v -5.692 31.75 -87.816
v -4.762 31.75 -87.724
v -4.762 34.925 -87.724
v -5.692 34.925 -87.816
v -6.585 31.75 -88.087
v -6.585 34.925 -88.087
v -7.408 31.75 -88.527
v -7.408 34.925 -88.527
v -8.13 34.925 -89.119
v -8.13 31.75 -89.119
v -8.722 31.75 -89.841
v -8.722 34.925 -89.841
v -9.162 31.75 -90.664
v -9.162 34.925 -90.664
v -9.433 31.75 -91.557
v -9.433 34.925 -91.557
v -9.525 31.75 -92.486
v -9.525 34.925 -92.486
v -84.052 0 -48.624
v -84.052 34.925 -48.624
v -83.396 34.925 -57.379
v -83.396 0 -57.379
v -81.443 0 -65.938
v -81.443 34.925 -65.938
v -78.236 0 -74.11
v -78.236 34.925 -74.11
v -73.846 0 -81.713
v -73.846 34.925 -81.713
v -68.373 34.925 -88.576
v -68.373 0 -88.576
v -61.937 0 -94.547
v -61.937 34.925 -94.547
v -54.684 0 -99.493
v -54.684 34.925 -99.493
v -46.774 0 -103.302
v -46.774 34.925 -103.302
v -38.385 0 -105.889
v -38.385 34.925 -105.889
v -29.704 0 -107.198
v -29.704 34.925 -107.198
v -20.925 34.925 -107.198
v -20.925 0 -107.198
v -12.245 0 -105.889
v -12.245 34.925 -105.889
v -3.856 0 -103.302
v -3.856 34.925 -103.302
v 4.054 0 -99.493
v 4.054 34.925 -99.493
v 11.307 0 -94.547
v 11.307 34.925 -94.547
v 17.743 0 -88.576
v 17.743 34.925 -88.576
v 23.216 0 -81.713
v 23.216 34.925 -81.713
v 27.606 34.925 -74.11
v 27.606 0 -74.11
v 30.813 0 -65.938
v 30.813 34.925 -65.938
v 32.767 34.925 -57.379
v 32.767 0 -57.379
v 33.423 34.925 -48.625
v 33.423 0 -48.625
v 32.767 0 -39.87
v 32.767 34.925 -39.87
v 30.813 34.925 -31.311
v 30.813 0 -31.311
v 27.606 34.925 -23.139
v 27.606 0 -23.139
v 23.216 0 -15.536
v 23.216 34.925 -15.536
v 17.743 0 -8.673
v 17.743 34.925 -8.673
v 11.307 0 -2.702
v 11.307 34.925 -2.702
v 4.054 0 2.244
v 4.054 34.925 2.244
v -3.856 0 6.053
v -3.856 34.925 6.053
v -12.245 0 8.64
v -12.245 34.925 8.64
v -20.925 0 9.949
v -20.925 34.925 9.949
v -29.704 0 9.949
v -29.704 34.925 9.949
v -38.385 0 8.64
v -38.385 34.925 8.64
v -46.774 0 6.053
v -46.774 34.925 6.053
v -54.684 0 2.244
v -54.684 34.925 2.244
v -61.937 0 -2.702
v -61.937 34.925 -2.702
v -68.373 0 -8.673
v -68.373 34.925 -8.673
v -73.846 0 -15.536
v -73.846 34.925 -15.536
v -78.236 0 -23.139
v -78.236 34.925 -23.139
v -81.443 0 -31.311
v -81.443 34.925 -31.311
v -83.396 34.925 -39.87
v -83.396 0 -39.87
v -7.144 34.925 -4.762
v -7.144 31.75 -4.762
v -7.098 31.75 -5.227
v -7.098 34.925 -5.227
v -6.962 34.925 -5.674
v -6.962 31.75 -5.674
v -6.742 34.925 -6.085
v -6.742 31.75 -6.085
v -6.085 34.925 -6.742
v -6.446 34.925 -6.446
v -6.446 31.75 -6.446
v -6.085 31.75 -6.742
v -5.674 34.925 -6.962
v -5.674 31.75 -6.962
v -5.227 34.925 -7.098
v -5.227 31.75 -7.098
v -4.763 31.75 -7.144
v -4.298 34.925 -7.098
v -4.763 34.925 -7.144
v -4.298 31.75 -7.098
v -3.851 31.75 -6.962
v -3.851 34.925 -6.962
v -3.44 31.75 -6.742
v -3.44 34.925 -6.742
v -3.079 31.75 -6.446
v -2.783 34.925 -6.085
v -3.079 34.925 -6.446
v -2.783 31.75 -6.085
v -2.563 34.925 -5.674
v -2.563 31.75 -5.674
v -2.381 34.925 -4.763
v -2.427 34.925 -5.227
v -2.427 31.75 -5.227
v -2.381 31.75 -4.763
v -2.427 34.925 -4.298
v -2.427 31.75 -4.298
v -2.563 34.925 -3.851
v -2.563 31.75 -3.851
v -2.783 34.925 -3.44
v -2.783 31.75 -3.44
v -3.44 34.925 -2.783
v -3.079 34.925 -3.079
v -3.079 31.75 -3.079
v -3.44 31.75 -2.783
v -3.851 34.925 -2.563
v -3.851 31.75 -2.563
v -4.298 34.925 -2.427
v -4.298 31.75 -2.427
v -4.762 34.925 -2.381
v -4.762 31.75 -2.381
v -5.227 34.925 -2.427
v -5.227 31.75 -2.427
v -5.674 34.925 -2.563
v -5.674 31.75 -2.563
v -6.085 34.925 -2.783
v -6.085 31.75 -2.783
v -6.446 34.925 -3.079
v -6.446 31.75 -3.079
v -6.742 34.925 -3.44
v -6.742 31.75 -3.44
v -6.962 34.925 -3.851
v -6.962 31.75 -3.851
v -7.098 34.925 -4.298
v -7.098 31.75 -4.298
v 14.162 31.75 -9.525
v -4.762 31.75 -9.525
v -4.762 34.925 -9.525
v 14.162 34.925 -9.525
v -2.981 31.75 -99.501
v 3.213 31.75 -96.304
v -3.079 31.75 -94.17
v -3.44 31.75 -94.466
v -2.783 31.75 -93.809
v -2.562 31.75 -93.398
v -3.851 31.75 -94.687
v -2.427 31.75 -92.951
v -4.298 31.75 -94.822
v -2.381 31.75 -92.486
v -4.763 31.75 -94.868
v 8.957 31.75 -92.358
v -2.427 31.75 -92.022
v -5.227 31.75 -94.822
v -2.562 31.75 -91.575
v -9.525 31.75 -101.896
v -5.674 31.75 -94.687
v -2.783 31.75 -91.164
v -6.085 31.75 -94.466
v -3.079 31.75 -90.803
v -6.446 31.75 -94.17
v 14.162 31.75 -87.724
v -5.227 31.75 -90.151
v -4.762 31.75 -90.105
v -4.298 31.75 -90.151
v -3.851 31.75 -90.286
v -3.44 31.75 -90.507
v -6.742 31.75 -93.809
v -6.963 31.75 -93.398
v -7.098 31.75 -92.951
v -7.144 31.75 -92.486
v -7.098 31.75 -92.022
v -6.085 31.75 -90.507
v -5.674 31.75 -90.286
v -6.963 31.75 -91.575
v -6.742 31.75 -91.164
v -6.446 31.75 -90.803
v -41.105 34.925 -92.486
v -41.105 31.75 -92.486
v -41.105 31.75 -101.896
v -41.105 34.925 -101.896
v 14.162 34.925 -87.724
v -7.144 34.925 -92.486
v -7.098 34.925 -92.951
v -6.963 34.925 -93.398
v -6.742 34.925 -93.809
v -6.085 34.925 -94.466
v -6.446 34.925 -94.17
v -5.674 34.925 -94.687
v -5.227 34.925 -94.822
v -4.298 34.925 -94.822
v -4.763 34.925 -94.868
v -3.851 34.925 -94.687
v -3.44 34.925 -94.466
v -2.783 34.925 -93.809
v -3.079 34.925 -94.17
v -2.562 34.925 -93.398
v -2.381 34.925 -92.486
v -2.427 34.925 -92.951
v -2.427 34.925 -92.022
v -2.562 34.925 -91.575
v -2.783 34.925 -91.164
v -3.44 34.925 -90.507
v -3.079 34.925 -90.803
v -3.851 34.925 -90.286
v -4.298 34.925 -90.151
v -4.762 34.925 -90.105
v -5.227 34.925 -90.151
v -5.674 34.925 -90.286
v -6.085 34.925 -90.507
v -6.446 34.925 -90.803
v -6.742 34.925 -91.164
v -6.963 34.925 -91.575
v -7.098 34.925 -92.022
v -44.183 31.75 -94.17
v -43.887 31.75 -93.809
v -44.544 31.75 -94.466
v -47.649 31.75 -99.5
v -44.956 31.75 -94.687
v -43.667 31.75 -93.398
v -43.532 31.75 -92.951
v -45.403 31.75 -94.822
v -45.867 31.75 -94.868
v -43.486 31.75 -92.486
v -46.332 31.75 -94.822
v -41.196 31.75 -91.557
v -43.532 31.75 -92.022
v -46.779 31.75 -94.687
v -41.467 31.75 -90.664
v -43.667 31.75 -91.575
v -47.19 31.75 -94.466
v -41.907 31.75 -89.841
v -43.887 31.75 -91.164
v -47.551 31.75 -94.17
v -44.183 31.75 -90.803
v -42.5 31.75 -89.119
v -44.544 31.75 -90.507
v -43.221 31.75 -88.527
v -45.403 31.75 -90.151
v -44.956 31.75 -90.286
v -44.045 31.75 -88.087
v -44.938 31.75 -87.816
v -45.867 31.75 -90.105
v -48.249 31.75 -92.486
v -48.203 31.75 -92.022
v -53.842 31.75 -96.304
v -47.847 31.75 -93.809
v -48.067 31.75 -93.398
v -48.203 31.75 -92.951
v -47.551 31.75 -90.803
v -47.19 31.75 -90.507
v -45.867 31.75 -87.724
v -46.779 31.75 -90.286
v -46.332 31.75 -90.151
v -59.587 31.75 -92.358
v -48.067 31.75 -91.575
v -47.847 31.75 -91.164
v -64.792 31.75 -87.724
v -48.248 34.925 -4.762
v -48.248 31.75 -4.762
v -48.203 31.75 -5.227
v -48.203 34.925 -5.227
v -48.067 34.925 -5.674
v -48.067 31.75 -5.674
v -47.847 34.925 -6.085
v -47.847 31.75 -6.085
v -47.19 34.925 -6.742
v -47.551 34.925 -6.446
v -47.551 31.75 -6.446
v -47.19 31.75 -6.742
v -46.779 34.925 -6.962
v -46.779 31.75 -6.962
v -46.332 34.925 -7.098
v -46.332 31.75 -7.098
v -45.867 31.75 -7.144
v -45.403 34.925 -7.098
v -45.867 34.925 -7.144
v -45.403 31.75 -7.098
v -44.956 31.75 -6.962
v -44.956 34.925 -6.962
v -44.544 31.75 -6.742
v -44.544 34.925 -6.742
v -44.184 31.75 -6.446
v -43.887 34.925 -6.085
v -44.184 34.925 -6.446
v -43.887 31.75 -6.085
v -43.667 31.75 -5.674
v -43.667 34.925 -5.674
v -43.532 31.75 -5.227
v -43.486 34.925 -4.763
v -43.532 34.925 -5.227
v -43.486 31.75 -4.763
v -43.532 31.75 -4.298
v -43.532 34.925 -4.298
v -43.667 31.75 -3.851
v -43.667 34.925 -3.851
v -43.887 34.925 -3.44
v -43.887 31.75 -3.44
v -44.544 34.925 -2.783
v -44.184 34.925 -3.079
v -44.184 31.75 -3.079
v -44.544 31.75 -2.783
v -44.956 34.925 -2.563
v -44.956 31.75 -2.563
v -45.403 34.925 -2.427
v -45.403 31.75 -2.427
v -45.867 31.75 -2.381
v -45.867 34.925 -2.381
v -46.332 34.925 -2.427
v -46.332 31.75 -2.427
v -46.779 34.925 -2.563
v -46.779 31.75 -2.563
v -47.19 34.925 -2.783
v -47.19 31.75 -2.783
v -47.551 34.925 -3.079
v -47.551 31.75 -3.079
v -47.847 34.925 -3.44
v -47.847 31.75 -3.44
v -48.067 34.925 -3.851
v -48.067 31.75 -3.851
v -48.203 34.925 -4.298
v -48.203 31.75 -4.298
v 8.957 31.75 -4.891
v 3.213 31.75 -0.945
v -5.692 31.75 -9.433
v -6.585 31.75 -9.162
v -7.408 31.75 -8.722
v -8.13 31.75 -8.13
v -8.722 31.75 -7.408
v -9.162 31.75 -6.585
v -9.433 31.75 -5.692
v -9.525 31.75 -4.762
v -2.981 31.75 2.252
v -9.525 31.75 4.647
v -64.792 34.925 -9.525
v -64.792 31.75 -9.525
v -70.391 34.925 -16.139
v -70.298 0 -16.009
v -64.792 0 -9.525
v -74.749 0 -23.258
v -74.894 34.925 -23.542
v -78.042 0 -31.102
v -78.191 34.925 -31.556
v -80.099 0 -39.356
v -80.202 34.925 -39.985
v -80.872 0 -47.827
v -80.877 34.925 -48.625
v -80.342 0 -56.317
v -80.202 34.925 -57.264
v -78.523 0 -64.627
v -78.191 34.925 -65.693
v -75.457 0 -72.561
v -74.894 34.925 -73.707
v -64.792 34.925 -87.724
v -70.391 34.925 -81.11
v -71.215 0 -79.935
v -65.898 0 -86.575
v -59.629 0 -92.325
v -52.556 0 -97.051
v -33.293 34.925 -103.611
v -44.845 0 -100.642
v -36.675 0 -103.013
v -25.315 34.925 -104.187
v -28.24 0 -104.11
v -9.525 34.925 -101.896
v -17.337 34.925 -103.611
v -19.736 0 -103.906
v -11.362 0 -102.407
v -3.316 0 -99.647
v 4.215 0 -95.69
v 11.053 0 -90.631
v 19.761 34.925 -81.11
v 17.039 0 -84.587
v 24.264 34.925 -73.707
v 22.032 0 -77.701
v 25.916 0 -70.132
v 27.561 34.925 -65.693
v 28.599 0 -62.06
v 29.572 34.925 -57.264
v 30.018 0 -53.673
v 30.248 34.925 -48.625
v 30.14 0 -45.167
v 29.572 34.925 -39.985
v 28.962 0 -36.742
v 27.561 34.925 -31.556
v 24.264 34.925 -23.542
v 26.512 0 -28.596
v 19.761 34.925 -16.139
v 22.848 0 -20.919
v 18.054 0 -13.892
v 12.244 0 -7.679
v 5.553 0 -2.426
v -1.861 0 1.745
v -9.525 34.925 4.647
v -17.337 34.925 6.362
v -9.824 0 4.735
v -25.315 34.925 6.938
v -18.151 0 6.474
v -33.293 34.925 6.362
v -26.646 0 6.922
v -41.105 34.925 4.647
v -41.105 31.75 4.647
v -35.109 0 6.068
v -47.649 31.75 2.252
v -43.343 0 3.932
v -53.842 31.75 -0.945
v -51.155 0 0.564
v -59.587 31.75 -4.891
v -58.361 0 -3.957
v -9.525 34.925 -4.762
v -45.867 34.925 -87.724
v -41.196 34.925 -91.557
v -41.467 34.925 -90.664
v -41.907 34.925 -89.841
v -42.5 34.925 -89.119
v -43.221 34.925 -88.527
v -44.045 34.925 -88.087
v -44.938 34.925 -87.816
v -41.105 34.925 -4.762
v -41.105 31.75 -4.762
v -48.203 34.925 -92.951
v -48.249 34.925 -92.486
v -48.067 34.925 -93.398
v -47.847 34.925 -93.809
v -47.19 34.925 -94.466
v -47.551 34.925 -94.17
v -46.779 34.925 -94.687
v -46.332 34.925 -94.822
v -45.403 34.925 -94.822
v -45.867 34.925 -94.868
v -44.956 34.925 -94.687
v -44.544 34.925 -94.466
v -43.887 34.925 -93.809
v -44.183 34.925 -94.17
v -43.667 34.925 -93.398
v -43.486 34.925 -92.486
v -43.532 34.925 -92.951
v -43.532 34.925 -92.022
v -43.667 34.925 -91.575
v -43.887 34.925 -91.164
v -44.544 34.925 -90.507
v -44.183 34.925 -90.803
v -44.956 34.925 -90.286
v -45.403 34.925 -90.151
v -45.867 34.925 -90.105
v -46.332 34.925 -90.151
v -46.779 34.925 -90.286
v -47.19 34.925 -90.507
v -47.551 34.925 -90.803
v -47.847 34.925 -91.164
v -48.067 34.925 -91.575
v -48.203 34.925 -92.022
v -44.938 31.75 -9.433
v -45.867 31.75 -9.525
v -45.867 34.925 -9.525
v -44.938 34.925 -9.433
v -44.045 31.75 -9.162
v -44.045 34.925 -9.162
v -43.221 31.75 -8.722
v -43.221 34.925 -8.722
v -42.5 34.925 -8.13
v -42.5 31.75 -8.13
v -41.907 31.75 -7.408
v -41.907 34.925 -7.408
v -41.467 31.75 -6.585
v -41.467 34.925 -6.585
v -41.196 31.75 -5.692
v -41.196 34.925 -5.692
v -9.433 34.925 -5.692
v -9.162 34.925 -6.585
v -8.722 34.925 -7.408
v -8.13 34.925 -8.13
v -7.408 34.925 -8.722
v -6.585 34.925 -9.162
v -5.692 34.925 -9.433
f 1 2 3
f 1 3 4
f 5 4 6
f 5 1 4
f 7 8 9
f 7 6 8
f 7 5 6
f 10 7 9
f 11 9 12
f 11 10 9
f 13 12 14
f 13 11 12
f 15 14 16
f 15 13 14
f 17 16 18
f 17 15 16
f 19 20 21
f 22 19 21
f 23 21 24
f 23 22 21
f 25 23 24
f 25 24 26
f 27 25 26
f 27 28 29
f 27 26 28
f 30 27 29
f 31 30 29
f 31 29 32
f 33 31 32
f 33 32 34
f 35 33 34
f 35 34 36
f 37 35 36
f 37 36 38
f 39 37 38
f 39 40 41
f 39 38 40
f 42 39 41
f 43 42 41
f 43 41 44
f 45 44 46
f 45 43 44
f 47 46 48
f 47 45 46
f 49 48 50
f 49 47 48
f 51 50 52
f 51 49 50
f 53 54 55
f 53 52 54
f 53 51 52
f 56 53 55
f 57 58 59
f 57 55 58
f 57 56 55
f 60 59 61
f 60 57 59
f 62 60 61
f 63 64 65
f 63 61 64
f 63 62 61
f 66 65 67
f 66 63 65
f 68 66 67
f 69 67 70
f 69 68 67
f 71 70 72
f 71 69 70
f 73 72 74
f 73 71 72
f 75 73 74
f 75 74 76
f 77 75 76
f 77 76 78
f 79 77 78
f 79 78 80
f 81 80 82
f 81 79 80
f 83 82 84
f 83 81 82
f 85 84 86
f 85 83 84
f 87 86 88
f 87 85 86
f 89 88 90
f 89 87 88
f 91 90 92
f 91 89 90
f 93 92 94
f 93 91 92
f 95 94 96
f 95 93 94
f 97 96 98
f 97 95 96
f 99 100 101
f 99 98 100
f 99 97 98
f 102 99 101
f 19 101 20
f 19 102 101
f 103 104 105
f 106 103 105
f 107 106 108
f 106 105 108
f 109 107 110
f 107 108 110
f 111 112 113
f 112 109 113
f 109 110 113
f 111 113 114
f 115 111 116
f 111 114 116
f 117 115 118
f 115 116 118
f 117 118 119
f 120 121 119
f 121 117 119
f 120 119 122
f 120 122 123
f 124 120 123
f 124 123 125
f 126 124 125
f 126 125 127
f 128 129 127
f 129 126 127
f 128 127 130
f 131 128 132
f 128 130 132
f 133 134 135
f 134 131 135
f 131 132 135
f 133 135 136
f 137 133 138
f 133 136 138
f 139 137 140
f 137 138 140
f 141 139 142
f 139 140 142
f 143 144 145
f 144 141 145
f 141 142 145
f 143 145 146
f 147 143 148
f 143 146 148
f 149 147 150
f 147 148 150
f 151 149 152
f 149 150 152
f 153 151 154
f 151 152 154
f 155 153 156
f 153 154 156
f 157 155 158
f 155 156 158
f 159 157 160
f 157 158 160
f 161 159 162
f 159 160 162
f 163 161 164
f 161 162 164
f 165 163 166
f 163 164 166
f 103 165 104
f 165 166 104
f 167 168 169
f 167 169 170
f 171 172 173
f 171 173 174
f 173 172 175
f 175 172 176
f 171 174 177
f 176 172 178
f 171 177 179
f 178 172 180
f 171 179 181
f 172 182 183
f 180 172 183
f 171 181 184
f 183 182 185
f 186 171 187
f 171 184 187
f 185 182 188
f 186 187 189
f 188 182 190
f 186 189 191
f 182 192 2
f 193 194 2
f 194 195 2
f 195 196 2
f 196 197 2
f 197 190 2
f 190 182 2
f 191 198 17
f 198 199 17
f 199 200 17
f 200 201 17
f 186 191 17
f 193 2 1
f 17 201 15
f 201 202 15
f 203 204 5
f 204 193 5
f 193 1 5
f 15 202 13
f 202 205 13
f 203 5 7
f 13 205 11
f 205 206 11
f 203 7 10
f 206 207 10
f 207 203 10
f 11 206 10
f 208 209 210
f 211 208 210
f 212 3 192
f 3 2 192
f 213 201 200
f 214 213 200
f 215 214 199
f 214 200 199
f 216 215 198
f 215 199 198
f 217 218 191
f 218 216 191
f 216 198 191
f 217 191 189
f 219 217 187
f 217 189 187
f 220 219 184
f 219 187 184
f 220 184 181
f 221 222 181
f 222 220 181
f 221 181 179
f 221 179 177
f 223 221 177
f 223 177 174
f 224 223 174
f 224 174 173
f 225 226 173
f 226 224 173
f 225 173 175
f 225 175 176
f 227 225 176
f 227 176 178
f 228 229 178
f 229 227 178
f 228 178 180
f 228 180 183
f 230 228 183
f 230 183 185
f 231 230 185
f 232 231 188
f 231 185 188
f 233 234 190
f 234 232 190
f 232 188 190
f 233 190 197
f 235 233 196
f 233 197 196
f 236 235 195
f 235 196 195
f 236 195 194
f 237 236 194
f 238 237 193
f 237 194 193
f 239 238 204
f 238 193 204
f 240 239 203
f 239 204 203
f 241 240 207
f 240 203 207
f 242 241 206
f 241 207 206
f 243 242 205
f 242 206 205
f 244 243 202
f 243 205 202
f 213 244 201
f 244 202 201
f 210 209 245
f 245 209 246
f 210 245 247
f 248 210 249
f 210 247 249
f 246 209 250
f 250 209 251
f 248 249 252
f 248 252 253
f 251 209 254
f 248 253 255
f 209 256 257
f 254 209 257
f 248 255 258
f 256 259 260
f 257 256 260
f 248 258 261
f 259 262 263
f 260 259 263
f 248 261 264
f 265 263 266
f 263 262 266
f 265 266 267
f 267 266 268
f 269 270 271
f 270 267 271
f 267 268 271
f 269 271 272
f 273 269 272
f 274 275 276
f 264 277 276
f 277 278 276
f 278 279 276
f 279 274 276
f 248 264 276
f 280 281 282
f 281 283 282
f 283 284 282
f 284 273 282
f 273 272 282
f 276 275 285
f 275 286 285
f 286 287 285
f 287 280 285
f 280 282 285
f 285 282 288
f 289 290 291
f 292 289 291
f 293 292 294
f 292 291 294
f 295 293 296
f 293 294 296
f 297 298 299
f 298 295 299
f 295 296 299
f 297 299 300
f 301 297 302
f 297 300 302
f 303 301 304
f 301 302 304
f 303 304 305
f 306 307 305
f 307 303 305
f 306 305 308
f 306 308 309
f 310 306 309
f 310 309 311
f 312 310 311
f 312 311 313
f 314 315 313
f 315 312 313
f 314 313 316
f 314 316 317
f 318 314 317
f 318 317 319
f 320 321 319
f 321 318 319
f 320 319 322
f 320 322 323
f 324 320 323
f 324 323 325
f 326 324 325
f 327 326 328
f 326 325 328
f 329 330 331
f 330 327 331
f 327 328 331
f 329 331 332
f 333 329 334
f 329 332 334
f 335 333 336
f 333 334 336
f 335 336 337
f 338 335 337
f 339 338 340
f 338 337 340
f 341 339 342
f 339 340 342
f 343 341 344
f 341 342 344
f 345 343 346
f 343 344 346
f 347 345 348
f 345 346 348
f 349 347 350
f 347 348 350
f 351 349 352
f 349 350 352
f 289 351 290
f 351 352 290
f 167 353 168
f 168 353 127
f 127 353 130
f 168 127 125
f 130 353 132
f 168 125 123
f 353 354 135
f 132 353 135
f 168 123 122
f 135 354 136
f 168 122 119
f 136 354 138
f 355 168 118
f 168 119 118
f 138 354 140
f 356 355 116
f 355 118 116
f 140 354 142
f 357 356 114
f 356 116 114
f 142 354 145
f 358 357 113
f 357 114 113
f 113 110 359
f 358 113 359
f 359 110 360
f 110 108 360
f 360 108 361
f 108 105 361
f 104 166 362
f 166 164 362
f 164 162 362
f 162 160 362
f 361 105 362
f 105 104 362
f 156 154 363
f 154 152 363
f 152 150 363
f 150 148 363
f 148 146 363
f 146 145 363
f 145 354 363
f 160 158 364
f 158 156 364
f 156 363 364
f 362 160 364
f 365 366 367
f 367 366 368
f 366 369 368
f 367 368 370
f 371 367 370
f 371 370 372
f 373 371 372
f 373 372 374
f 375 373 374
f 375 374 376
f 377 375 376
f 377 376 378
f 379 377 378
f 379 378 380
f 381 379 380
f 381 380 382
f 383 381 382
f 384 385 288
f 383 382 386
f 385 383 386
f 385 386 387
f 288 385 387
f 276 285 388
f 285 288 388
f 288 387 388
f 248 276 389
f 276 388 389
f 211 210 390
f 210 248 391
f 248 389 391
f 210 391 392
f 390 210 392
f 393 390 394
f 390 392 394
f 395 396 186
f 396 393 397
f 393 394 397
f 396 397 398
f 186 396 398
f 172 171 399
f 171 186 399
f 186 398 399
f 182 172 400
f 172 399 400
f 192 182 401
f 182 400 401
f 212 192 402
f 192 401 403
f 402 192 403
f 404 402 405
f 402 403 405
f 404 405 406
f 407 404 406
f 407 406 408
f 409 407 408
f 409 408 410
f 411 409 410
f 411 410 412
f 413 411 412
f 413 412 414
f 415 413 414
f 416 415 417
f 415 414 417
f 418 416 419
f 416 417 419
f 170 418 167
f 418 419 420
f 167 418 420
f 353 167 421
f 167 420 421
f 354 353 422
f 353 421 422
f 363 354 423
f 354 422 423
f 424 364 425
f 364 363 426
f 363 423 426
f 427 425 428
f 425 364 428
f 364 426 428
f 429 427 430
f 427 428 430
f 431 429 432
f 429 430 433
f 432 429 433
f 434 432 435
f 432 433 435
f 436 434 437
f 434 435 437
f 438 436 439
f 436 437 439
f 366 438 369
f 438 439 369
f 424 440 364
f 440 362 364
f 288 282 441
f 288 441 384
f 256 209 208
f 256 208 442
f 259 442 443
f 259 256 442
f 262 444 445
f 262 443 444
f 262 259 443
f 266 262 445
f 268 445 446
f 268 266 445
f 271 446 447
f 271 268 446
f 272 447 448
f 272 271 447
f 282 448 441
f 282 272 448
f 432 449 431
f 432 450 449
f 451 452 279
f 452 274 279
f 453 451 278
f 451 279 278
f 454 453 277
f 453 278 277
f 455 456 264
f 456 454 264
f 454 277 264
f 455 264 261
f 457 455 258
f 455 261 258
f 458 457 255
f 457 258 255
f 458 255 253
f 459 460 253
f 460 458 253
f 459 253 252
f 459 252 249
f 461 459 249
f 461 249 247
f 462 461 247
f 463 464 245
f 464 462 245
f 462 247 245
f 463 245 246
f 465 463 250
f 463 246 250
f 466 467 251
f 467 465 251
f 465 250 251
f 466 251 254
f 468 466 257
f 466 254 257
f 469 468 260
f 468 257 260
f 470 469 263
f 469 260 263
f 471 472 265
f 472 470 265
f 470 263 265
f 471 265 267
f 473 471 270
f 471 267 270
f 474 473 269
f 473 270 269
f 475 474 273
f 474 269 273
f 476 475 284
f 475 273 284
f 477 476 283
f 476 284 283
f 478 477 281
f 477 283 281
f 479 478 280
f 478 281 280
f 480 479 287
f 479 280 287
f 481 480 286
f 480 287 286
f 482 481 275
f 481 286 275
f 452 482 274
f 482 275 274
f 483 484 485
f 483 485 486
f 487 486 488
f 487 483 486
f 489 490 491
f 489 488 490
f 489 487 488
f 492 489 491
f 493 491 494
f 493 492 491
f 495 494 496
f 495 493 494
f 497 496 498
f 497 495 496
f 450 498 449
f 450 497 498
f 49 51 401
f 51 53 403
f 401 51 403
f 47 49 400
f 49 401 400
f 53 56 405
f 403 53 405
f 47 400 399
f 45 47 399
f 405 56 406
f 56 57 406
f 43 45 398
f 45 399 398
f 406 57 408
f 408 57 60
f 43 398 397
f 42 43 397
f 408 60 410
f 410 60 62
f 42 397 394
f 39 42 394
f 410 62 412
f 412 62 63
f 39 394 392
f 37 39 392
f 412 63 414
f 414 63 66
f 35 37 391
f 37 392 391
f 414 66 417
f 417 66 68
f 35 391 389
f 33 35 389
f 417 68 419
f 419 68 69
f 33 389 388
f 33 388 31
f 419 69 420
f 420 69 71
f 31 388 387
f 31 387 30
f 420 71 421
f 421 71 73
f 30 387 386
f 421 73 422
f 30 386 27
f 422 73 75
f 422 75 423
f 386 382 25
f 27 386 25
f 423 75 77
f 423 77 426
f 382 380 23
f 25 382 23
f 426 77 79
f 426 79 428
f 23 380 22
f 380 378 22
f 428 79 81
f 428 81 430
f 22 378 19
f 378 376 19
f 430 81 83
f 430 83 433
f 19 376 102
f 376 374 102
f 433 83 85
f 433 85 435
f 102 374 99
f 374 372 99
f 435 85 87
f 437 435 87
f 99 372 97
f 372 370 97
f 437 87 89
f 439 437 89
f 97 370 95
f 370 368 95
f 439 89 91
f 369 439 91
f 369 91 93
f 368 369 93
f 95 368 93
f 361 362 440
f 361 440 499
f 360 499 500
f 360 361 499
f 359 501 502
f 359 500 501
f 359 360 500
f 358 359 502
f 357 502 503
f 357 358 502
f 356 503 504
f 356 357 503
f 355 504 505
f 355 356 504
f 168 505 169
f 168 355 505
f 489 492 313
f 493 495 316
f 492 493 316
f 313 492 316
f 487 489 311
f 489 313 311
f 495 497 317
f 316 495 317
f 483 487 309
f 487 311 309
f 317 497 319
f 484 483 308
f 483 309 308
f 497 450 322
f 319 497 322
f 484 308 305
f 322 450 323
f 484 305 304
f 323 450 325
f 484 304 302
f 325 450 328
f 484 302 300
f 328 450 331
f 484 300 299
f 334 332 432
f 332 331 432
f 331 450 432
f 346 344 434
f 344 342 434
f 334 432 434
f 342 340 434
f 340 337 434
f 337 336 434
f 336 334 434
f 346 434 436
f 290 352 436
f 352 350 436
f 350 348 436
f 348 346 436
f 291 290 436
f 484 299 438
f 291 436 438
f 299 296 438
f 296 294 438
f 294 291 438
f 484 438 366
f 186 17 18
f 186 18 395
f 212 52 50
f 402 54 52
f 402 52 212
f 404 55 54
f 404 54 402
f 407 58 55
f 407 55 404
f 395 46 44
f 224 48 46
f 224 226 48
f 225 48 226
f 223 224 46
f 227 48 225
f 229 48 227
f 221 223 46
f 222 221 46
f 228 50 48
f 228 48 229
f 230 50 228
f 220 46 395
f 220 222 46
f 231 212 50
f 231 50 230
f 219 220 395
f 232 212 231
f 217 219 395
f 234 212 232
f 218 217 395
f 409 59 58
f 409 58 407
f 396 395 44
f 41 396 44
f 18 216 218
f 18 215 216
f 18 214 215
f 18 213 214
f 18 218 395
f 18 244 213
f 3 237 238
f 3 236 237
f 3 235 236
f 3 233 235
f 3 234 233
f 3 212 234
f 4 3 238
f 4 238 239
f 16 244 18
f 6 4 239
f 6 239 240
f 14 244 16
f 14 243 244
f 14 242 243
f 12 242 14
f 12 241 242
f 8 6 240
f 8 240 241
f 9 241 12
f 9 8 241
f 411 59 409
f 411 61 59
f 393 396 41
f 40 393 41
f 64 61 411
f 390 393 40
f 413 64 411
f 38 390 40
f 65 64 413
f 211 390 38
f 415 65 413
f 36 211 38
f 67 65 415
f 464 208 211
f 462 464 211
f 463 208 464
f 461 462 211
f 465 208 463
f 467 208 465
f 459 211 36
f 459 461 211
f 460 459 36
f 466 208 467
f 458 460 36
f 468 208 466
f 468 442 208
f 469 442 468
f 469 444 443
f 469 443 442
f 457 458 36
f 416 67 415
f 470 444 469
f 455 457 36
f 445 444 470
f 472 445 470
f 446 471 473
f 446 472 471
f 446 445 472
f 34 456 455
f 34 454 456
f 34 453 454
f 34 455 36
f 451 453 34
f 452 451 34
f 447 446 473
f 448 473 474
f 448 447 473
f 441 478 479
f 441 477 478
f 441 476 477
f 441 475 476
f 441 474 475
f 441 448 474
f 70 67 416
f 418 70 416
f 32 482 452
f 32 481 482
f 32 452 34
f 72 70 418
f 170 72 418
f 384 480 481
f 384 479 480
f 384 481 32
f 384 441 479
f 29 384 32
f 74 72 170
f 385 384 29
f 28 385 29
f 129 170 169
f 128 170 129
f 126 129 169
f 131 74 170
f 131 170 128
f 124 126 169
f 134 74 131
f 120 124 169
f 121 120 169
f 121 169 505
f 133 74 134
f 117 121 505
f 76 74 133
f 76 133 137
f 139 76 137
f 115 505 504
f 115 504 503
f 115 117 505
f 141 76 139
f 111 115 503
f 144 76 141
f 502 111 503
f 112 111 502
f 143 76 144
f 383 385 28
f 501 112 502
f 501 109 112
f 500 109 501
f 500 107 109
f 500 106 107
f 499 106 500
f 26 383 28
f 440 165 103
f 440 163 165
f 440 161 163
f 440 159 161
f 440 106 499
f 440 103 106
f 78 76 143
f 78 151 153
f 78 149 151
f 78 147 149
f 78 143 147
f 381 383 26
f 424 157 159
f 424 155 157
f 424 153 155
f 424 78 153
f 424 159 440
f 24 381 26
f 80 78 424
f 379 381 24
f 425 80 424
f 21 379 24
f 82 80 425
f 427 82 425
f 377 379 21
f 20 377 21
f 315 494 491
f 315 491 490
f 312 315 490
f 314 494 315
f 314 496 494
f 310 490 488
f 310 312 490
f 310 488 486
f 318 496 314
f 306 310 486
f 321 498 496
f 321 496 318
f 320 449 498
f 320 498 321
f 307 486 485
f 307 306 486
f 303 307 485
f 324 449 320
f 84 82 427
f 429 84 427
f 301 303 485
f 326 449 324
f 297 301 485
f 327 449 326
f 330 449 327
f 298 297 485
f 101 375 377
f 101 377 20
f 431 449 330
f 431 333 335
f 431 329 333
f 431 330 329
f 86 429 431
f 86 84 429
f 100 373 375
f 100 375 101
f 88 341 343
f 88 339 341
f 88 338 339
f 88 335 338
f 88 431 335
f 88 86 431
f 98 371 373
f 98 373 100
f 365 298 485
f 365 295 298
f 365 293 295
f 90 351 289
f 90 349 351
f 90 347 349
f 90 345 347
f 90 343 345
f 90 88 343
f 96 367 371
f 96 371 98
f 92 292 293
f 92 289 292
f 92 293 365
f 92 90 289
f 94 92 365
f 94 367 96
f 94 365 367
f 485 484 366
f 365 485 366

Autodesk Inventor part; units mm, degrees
ref_plane "YZ Plane" through (0, 0, 0) normal (1, 0, 0) x (0, 1, 0)
ref_plane "XZ Plane" through (0, 0, 0) normal (0, 1, 0) x (-1, 0, 0)
ref_plane "XY Plane" through (0, 0, 0) normal (0, 0, 1) x (1, 0, 0)
sketch "Sketch1" plane through (0, 0, 0) normal (0, 1, 0) x (-1, 0, 0)
  circle A0 centre (25.3149, -48.6245) radius 55.5625
  circle A1 centre (25.3149, -48.6245) radius 58.7375
  line L0 (0, -48.6245) -> (50.6298, -48.6245)
  line L1 (25.3149, -97.249) -> (25.3149, 0)
  circle A2 centre (45.8673, -4.7625) radius 2.3812
  circle A3 centre (4.7625, -4.7625) radius 2.3812
  circle A4 centre (45.8673, -92.4865) radius 2.3813
  circle A5 centre (4.7625, -92.4865) radius 2.3813
  arc A6 (45.8673, -87.724) -> (41.1048, -92.4865) centre (45.8673, -92.4865) ccw
  arc A7 (41.1048, -4.7625) -> (45.8673, -9.525) centre (45.8673, -4.7625) ccw
  arc A8 (4.7625, -9.525) -> (9.525, -4.7625) centre (4.7625, -4.7625) ccw
  line L2 (41.1048, -4.7625) -> (41.1048, 4.6472)
  line L3 (45.8673, -9.525) -> (64.7917, -9.525)
  line L4 (9.525, -4.7625) -> (9.525, 4.6472)
  line L5 (4.7625, -9.525) -> (-14.162, -9.525)
  line L6 (4.7625, -87.724) -> (-14.162, -87.724)
  line L7 (9.525, -92.4865) -> (9.525, -101.8962)
  line L8 (41.1048, -92.4865) -> (41.1048, -101.8961)
  line L9 (45.8673, -87.724) -> (64.7917, -87.724)
  arc A9 (9.525, -92.4865) -> (4.7625, -87.724) centre (4.7625, -92.4865) ccw
  point P0 (0, 0)
  dimension "d3" = 111.125
  dimension "d4" = 117.475
extrude "Extrusion1" add sketch "Sketch1" along normal blind 34.925 contours L3 A7 L2 A0 | A0 L8 A6 L9 | L4 A8 L5 A0 | A0 L6 A9 L7 | A1
extrude "Extrusion2" cut sketch "Sketch1" along normal blind 31.75 contours L3 A7 L2 A0 | A0 L8 A6 L9 | L4 A8 L5 A0 | A0 L6 A9 L7
properties part number "TxCeilingMount"
